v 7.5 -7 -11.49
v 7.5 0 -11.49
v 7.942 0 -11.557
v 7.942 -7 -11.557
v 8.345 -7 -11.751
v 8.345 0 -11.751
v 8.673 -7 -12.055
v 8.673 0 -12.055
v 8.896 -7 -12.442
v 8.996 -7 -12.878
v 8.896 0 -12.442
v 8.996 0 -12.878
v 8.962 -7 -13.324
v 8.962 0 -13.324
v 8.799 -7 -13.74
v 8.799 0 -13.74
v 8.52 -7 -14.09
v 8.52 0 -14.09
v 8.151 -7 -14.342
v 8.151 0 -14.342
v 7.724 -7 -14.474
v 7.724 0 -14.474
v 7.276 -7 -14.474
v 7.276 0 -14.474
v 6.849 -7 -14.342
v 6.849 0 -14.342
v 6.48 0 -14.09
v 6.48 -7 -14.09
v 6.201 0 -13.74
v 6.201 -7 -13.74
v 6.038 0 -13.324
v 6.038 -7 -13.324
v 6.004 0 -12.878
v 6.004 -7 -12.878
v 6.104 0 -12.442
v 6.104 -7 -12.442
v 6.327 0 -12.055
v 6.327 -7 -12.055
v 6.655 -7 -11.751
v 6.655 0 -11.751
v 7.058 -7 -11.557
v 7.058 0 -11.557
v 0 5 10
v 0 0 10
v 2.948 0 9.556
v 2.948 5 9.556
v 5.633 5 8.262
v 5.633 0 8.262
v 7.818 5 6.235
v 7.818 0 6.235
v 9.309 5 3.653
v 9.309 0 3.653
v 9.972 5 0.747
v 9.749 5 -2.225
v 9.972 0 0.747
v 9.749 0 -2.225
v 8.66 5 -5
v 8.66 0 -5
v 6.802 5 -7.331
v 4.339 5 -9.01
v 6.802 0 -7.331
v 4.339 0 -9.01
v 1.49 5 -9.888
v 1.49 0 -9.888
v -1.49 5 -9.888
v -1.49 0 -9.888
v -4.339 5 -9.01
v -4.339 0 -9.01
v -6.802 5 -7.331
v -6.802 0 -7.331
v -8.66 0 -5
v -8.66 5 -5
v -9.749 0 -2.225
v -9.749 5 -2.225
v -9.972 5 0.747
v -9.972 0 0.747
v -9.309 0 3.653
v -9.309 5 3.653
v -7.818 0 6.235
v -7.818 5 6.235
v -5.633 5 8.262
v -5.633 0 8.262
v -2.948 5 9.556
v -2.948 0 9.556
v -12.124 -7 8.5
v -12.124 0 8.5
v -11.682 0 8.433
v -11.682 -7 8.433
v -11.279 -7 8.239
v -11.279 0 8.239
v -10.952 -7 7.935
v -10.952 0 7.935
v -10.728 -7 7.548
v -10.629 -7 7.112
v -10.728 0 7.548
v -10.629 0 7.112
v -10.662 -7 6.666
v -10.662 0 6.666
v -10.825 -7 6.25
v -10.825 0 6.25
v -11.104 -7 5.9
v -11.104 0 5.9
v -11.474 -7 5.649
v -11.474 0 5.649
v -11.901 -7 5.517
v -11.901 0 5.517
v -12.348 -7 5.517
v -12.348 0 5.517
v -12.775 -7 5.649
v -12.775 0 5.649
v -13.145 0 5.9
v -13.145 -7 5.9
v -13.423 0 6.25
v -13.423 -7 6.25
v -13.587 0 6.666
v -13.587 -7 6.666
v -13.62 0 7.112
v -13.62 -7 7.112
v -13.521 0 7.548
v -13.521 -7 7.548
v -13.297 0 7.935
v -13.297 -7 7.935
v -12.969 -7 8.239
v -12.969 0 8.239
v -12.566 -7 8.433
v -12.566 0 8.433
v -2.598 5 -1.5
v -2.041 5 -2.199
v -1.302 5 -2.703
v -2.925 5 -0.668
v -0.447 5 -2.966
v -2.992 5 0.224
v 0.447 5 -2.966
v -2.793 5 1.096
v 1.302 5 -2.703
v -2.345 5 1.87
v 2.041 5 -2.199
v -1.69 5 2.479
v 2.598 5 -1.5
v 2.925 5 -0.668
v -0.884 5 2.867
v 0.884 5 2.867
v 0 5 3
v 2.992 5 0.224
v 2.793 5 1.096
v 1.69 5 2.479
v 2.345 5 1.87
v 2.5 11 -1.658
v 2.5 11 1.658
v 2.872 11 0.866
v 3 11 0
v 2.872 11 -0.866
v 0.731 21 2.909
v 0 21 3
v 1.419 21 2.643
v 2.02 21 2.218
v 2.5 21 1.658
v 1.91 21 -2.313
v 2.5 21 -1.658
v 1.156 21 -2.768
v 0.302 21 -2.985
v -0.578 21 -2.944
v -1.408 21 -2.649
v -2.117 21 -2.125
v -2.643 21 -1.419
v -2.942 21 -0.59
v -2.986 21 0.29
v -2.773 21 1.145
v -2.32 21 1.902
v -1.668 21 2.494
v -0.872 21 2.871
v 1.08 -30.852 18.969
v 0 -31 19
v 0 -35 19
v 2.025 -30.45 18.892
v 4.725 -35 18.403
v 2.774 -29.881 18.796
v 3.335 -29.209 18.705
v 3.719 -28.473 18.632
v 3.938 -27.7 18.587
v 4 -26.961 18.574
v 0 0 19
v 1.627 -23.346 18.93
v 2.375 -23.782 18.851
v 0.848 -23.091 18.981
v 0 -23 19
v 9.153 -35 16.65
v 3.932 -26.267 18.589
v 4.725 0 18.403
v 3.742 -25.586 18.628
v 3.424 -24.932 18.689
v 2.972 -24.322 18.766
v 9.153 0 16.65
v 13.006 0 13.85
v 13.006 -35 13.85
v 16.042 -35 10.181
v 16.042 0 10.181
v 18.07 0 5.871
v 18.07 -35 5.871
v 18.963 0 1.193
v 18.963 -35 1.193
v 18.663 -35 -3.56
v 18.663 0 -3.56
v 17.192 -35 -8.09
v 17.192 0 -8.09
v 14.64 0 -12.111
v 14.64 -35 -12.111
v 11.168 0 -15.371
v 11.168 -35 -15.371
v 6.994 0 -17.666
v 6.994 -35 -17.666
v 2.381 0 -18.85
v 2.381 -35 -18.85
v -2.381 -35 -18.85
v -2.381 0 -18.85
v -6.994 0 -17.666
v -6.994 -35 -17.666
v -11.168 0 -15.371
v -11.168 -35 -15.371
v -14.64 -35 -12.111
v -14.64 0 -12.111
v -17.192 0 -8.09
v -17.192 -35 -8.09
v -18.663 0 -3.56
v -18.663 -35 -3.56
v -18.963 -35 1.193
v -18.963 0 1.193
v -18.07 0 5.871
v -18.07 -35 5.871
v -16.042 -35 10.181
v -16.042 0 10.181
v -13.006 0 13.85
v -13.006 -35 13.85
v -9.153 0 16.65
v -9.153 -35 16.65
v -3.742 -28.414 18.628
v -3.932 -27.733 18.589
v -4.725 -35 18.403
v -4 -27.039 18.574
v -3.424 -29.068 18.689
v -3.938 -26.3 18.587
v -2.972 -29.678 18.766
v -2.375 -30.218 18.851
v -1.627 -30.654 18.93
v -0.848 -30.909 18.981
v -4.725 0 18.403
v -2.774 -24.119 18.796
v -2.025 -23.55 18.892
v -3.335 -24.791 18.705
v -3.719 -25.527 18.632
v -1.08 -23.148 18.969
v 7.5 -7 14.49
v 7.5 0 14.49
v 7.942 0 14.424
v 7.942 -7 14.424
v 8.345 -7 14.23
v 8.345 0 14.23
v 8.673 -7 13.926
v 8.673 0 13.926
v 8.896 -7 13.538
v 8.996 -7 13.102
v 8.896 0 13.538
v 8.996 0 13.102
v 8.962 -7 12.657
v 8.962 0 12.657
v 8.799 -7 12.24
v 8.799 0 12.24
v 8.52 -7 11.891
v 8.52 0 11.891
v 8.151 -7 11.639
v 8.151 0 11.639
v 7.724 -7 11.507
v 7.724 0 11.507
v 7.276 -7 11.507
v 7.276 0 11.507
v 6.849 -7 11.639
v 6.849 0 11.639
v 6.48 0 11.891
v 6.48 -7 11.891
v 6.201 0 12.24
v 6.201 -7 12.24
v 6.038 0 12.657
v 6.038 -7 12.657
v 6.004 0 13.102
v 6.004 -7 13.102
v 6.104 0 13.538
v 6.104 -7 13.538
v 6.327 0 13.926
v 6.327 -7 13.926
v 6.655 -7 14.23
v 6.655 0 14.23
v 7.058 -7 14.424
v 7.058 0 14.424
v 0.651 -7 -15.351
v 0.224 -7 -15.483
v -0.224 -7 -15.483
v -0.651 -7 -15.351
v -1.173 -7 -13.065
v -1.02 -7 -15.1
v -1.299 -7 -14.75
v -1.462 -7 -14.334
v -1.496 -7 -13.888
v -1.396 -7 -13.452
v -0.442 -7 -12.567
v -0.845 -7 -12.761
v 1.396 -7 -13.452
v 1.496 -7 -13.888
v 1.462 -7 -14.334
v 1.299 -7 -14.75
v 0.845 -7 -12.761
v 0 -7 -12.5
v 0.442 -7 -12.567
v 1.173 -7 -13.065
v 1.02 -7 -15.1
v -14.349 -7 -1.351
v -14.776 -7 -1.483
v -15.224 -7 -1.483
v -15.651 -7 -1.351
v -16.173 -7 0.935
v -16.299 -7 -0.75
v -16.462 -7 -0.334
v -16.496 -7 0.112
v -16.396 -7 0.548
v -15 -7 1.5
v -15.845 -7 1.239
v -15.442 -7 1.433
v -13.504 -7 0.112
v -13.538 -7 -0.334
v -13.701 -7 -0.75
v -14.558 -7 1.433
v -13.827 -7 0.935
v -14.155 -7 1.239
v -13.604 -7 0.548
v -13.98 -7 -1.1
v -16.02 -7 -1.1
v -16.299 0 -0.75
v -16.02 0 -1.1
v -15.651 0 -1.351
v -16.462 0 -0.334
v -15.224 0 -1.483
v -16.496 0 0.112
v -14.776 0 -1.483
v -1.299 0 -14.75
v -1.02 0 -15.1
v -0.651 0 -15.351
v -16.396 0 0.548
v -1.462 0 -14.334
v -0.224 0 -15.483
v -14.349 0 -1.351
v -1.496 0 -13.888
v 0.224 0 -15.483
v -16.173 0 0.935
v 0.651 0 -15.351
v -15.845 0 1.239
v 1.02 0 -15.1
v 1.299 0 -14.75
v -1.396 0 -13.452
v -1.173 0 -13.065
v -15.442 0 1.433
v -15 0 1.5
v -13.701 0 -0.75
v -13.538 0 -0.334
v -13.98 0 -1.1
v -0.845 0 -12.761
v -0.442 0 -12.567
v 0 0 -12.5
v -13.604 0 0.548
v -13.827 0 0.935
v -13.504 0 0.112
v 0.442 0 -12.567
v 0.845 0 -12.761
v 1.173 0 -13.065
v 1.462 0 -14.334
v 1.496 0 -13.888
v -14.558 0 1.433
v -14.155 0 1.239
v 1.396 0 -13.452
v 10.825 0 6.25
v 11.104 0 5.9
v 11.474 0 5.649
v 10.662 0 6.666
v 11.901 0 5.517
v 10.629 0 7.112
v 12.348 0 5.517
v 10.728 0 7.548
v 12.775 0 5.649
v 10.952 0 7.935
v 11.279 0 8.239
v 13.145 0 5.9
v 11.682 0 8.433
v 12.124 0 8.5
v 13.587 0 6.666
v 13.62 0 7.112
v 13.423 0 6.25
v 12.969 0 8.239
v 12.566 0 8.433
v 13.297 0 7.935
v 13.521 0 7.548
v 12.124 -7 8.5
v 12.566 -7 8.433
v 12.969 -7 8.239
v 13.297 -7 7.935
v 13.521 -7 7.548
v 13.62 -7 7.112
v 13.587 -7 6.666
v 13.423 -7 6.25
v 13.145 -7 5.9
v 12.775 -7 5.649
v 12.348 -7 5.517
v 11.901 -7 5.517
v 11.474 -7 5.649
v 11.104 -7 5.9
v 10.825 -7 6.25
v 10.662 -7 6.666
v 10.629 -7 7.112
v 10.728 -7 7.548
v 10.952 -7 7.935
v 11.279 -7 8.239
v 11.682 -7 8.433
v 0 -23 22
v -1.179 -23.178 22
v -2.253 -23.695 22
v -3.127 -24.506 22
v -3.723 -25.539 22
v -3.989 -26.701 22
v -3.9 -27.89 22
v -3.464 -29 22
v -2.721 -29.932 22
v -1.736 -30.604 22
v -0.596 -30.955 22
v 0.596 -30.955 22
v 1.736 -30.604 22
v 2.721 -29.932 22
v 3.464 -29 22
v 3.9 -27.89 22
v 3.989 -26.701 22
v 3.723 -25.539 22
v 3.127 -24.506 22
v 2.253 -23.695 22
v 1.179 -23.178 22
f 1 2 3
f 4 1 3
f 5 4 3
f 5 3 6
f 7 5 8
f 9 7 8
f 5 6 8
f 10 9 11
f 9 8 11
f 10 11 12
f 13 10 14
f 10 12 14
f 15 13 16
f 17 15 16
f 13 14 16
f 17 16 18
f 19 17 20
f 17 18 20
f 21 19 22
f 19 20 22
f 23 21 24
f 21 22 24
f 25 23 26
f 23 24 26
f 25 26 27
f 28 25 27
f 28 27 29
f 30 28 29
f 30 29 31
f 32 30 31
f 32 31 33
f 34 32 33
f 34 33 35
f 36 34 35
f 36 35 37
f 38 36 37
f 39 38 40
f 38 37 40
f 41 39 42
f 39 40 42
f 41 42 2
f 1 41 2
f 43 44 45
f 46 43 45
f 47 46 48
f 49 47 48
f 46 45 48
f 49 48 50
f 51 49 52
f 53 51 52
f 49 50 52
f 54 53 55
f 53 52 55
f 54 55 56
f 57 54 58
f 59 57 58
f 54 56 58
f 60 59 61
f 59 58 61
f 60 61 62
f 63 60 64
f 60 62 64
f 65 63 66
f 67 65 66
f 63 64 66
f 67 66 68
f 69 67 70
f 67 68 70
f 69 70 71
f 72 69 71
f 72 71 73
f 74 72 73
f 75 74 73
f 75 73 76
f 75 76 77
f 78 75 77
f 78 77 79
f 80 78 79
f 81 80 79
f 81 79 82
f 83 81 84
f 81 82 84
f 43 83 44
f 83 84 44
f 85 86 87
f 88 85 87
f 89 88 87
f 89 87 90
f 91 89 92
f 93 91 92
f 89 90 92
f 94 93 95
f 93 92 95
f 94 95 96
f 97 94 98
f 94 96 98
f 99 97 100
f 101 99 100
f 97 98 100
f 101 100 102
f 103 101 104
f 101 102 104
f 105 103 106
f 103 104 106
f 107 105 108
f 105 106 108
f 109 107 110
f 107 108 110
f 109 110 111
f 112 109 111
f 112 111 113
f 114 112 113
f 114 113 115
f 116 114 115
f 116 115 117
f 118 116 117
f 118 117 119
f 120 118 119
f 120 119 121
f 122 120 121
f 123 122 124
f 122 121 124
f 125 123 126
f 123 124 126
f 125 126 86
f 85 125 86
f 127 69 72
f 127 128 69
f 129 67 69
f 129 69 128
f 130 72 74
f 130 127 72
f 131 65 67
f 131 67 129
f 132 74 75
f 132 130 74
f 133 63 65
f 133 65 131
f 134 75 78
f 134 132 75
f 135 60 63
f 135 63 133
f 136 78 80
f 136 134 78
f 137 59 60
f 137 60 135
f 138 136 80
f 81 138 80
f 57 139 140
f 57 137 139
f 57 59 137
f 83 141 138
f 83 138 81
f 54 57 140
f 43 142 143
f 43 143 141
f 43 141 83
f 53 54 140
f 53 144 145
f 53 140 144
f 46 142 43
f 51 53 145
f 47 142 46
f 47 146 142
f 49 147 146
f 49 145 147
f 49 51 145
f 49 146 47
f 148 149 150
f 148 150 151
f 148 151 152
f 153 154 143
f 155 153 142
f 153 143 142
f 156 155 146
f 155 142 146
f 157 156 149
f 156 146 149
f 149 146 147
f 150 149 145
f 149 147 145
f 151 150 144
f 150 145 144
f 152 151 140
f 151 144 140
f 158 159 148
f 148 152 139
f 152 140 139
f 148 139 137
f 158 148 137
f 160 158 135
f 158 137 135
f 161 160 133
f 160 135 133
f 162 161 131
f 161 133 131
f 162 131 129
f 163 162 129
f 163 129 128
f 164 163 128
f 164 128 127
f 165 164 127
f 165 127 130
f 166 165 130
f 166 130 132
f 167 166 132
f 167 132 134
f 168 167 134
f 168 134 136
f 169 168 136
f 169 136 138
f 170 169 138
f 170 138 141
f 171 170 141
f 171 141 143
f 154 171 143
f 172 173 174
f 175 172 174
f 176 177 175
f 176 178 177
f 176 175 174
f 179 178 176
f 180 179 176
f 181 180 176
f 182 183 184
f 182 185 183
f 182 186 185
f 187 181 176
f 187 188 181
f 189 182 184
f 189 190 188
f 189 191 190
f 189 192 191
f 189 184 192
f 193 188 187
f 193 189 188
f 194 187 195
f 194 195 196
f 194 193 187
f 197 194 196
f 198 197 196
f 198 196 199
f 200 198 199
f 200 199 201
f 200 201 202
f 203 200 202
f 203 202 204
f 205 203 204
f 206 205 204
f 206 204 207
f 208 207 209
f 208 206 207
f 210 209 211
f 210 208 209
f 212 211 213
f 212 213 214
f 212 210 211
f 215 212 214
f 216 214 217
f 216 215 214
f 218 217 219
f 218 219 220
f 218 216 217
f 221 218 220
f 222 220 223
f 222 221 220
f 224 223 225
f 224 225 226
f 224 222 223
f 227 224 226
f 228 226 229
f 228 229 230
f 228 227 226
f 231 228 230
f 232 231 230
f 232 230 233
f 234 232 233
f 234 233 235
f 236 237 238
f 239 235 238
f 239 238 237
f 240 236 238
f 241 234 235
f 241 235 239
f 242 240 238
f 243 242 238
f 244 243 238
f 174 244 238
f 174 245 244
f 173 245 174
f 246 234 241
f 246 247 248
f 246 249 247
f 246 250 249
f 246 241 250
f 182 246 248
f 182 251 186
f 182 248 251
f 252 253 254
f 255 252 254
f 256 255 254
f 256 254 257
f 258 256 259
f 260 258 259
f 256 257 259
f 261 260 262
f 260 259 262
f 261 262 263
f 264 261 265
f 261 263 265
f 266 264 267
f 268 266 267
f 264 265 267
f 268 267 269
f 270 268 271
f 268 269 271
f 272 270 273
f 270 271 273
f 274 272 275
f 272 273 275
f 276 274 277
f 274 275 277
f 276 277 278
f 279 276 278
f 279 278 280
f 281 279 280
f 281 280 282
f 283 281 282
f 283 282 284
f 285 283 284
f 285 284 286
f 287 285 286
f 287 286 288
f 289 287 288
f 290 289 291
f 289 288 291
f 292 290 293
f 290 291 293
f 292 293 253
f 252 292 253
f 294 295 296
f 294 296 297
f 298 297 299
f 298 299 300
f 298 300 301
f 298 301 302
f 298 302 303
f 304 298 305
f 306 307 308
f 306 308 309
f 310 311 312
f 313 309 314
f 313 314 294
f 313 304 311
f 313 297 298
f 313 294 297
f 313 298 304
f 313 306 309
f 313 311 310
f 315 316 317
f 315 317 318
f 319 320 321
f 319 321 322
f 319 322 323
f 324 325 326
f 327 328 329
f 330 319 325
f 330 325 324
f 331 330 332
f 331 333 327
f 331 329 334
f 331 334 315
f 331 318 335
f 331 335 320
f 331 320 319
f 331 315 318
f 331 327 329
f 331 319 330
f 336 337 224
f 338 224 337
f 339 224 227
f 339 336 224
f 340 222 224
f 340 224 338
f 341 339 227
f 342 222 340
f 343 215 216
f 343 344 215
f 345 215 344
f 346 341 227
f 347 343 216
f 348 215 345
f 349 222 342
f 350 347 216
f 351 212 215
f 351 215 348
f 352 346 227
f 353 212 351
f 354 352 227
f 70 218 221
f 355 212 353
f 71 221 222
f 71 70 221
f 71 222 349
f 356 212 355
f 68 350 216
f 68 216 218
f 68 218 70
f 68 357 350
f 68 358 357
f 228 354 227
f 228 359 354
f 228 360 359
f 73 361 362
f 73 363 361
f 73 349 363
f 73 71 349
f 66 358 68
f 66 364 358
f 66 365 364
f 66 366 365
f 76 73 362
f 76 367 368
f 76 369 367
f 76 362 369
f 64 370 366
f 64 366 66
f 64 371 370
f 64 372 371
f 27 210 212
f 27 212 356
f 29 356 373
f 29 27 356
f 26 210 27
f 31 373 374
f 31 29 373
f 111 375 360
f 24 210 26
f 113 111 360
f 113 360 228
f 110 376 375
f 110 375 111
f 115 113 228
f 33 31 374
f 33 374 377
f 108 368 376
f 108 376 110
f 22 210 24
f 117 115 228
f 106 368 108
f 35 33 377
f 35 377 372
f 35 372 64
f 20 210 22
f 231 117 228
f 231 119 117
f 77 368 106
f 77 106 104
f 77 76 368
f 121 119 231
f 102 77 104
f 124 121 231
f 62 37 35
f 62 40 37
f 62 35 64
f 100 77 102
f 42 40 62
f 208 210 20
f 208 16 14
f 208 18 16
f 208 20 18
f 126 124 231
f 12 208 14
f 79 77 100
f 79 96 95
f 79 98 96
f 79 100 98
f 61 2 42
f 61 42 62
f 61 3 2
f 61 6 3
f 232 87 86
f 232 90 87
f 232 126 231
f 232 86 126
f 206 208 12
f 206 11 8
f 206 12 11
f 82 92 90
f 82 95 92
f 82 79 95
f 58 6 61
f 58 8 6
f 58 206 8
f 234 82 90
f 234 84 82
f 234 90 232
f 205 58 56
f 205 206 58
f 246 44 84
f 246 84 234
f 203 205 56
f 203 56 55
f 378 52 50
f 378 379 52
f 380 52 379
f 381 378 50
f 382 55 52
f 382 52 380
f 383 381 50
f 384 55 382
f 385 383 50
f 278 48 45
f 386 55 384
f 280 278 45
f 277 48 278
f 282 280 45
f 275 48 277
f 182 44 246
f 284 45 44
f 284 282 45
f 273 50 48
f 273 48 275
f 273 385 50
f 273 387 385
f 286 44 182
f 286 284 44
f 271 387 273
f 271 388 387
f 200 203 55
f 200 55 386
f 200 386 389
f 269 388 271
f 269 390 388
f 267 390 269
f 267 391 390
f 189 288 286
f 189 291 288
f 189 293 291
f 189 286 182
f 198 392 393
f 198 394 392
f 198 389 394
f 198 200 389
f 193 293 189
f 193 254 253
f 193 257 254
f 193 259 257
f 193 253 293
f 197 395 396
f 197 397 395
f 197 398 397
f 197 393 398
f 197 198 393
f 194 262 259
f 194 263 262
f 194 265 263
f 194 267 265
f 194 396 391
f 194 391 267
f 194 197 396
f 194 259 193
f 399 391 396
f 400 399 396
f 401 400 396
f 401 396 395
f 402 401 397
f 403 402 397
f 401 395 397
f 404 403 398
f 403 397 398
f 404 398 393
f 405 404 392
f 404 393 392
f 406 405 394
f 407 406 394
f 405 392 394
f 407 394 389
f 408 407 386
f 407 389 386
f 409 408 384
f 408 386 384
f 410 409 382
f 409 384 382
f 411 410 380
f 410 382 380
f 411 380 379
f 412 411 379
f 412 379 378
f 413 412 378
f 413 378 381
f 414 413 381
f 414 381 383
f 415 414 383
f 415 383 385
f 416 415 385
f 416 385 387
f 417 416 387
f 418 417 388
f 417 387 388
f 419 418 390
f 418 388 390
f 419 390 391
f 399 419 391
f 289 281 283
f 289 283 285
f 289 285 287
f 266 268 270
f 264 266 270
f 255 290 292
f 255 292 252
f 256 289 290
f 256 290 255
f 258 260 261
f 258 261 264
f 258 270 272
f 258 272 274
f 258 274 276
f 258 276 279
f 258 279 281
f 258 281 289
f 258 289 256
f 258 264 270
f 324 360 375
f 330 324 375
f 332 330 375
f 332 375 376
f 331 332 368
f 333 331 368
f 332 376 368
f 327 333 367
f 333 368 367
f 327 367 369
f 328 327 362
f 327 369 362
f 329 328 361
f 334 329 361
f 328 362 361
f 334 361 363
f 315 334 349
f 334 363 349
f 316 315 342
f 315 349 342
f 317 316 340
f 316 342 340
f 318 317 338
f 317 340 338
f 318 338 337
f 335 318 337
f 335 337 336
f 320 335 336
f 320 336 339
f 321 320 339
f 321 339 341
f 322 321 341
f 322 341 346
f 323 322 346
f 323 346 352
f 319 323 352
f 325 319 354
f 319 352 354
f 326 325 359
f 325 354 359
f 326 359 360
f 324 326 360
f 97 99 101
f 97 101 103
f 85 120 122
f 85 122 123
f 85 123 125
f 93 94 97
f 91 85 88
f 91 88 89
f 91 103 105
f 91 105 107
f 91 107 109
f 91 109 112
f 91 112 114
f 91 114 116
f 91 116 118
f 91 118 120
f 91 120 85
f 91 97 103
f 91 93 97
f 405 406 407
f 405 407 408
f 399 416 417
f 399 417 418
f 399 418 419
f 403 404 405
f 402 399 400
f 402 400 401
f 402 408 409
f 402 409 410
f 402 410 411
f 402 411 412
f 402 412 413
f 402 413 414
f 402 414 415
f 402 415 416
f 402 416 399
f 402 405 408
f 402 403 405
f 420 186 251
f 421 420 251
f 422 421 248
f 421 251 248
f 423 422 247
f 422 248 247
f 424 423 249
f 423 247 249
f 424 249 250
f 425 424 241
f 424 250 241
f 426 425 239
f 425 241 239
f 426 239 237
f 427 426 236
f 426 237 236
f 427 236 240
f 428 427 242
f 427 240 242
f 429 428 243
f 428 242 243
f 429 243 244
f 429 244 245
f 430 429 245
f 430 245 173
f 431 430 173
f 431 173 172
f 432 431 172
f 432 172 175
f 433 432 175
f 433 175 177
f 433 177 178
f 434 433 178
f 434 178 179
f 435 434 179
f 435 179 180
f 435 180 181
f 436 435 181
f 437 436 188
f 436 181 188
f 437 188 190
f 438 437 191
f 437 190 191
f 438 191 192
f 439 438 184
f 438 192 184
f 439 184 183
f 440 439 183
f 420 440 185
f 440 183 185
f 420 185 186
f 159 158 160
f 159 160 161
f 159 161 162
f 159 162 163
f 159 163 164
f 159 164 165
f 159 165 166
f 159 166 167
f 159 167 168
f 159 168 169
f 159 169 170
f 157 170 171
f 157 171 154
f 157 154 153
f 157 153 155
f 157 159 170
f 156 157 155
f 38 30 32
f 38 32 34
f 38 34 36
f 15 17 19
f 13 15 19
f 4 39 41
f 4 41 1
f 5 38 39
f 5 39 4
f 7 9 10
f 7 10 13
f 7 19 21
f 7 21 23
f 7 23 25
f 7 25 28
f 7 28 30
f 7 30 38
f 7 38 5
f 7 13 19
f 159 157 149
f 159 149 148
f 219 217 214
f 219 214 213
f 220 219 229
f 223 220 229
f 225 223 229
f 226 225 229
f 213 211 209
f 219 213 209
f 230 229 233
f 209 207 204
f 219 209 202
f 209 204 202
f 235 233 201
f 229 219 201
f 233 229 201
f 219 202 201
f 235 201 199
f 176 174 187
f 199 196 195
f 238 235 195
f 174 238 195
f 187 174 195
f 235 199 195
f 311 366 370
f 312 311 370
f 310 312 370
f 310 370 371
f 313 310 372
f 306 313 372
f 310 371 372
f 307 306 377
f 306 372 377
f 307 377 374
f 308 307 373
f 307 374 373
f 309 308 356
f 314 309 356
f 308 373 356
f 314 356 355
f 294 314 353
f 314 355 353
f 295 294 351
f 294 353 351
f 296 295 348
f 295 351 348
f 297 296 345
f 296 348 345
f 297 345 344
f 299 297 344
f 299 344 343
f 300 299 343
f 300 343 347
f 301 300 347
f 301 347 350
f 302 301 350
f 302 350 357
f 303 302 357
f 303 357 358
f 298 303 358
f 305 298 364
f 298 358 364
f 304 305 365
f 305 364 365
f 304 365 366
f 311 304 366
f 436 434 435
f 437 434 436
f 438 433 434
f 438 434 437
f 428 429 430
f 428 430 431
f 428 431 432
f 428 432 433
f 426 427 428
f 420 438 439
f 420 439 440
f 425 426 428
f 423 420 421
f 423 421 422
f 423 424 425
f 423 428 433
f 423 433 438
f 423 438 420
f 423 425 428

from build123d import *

# Parameters (mm, degrees)
SKETCH2_R           = 19
BOSS_EXTRUDE2_DEPTH = 35
SKETCH4_R           = 10
BOSS_EXTRUDE3_DEPTH = 5
SKETCH5_R           = 3
BOSS_EXTRUDE4_DEPTH = 16
SKETCH8_W           = 0.5
SKETCH8_H           = 6.116200225
CUT_EXTRUDE2_DEPTH  = 10
SKETCH10_R          = 1.5
CUT_EXTRUDE3_DEPTH  = 7
SKETCH15_R          = 4
BOSS_EXTRUDE5_DEPTH = 22


with BuildPart() as part:
    # Sketch2 → Boss-Extrude2 (new body)
    with BuildSketch(Plane(origin=(0, 0, 0), x_dir=(1, 0, 0), z_dir=(0, 1, 0))):
        with Locations(Location((0, 0, 0), (0, 0, 270))):
            Circle(SKETCH2_R)
    extrude(amount=-BOSS_EXTRUDE2_DEPTH)

    # Sketch4 → Boss-Extrude3 (add)
    with BuildSketch(Plane(origin=(0, 0, 0), x_dir=(1, 0, 0), z_dir=(0, 1, 0))):
        with Locations(Location((0, 0, 0), (0, 0, 270))):
            Circle(SKETCH4_R)
    extrude(amount=BOSS_EXTRUDE3_DEPTH)

    # Sketch5 → Boss-Extrude4 (add)
    with BuildSketch(Plane(origin=(0, 5, 0), x_dir=(1, 0, 0), z_dir=(0, 1, 0))):
        with Locations(Location((0, 0, 0), (0, 0, 270))):
            Circle(SKETCH5_R)
    extrude(amount=BOSS_EXTRUDE4_DEPTH)

    # Sketch8 → Cut-Extrude2 (cut)
    with BuildSketch(Plane(origin=(0, 21, 0), x_dir=(1, 0, 0), z_dir=(0, 1, 0))):
        with Locations((2.75, -0.083275924)):
            Rectangle(SKETCH8_W, SKETCH8_H)
    extrude(amount=-CUT_EXTRUDE2_DEPTH, mode=Mode.SUBTRACT)

    # Sketch10 → Cut-Extrude3 (cut)
    with BuildSketch(Plane(origin=(0, 0, 0), x_dir=(1, 0, 0), z_dir=(0, 1, 0))):
        with Locations(Location((-15, 0, 0), (0, 0, 270))):
            Circle(SKETCH10_R)
        with Locations(Location((0, 14, 0), (0, 0, 270))):
            Circle(SKETCH10_R)
        with Locations(Location((7.5, 12.990381057, 0), (0, 0, 270))):
            Circle(SKETCH10_R)
        with Locations(Location((7.5, -12.990381057, 0), (0, 0, 270))):
            Circle(SKETCH10_R)
        with Locations(Location((12.124355653, -7, 0), (0, 0, 270))):
            Circle(SKETCH10_R)
        with Locations(Location((-12.124355653, -7, 0), (0, 0, 270))):
            Circle(SKETCH10_R)
    extrude(amount=-CUT_EXTRUDE3_DEPTH, mode=Mode.SUBTRACT)

    # Sketch15 → Boss-Extrude5 (add)
    with BuildSketch(Plane.XY):
        with Locations(Location((0, -27, 0), (0, 0, 90))):
            Circle(SKETCH15_R)
    extrude(amount=BOSS_EXTRUDE5_DEPTH)


solid = part.part
